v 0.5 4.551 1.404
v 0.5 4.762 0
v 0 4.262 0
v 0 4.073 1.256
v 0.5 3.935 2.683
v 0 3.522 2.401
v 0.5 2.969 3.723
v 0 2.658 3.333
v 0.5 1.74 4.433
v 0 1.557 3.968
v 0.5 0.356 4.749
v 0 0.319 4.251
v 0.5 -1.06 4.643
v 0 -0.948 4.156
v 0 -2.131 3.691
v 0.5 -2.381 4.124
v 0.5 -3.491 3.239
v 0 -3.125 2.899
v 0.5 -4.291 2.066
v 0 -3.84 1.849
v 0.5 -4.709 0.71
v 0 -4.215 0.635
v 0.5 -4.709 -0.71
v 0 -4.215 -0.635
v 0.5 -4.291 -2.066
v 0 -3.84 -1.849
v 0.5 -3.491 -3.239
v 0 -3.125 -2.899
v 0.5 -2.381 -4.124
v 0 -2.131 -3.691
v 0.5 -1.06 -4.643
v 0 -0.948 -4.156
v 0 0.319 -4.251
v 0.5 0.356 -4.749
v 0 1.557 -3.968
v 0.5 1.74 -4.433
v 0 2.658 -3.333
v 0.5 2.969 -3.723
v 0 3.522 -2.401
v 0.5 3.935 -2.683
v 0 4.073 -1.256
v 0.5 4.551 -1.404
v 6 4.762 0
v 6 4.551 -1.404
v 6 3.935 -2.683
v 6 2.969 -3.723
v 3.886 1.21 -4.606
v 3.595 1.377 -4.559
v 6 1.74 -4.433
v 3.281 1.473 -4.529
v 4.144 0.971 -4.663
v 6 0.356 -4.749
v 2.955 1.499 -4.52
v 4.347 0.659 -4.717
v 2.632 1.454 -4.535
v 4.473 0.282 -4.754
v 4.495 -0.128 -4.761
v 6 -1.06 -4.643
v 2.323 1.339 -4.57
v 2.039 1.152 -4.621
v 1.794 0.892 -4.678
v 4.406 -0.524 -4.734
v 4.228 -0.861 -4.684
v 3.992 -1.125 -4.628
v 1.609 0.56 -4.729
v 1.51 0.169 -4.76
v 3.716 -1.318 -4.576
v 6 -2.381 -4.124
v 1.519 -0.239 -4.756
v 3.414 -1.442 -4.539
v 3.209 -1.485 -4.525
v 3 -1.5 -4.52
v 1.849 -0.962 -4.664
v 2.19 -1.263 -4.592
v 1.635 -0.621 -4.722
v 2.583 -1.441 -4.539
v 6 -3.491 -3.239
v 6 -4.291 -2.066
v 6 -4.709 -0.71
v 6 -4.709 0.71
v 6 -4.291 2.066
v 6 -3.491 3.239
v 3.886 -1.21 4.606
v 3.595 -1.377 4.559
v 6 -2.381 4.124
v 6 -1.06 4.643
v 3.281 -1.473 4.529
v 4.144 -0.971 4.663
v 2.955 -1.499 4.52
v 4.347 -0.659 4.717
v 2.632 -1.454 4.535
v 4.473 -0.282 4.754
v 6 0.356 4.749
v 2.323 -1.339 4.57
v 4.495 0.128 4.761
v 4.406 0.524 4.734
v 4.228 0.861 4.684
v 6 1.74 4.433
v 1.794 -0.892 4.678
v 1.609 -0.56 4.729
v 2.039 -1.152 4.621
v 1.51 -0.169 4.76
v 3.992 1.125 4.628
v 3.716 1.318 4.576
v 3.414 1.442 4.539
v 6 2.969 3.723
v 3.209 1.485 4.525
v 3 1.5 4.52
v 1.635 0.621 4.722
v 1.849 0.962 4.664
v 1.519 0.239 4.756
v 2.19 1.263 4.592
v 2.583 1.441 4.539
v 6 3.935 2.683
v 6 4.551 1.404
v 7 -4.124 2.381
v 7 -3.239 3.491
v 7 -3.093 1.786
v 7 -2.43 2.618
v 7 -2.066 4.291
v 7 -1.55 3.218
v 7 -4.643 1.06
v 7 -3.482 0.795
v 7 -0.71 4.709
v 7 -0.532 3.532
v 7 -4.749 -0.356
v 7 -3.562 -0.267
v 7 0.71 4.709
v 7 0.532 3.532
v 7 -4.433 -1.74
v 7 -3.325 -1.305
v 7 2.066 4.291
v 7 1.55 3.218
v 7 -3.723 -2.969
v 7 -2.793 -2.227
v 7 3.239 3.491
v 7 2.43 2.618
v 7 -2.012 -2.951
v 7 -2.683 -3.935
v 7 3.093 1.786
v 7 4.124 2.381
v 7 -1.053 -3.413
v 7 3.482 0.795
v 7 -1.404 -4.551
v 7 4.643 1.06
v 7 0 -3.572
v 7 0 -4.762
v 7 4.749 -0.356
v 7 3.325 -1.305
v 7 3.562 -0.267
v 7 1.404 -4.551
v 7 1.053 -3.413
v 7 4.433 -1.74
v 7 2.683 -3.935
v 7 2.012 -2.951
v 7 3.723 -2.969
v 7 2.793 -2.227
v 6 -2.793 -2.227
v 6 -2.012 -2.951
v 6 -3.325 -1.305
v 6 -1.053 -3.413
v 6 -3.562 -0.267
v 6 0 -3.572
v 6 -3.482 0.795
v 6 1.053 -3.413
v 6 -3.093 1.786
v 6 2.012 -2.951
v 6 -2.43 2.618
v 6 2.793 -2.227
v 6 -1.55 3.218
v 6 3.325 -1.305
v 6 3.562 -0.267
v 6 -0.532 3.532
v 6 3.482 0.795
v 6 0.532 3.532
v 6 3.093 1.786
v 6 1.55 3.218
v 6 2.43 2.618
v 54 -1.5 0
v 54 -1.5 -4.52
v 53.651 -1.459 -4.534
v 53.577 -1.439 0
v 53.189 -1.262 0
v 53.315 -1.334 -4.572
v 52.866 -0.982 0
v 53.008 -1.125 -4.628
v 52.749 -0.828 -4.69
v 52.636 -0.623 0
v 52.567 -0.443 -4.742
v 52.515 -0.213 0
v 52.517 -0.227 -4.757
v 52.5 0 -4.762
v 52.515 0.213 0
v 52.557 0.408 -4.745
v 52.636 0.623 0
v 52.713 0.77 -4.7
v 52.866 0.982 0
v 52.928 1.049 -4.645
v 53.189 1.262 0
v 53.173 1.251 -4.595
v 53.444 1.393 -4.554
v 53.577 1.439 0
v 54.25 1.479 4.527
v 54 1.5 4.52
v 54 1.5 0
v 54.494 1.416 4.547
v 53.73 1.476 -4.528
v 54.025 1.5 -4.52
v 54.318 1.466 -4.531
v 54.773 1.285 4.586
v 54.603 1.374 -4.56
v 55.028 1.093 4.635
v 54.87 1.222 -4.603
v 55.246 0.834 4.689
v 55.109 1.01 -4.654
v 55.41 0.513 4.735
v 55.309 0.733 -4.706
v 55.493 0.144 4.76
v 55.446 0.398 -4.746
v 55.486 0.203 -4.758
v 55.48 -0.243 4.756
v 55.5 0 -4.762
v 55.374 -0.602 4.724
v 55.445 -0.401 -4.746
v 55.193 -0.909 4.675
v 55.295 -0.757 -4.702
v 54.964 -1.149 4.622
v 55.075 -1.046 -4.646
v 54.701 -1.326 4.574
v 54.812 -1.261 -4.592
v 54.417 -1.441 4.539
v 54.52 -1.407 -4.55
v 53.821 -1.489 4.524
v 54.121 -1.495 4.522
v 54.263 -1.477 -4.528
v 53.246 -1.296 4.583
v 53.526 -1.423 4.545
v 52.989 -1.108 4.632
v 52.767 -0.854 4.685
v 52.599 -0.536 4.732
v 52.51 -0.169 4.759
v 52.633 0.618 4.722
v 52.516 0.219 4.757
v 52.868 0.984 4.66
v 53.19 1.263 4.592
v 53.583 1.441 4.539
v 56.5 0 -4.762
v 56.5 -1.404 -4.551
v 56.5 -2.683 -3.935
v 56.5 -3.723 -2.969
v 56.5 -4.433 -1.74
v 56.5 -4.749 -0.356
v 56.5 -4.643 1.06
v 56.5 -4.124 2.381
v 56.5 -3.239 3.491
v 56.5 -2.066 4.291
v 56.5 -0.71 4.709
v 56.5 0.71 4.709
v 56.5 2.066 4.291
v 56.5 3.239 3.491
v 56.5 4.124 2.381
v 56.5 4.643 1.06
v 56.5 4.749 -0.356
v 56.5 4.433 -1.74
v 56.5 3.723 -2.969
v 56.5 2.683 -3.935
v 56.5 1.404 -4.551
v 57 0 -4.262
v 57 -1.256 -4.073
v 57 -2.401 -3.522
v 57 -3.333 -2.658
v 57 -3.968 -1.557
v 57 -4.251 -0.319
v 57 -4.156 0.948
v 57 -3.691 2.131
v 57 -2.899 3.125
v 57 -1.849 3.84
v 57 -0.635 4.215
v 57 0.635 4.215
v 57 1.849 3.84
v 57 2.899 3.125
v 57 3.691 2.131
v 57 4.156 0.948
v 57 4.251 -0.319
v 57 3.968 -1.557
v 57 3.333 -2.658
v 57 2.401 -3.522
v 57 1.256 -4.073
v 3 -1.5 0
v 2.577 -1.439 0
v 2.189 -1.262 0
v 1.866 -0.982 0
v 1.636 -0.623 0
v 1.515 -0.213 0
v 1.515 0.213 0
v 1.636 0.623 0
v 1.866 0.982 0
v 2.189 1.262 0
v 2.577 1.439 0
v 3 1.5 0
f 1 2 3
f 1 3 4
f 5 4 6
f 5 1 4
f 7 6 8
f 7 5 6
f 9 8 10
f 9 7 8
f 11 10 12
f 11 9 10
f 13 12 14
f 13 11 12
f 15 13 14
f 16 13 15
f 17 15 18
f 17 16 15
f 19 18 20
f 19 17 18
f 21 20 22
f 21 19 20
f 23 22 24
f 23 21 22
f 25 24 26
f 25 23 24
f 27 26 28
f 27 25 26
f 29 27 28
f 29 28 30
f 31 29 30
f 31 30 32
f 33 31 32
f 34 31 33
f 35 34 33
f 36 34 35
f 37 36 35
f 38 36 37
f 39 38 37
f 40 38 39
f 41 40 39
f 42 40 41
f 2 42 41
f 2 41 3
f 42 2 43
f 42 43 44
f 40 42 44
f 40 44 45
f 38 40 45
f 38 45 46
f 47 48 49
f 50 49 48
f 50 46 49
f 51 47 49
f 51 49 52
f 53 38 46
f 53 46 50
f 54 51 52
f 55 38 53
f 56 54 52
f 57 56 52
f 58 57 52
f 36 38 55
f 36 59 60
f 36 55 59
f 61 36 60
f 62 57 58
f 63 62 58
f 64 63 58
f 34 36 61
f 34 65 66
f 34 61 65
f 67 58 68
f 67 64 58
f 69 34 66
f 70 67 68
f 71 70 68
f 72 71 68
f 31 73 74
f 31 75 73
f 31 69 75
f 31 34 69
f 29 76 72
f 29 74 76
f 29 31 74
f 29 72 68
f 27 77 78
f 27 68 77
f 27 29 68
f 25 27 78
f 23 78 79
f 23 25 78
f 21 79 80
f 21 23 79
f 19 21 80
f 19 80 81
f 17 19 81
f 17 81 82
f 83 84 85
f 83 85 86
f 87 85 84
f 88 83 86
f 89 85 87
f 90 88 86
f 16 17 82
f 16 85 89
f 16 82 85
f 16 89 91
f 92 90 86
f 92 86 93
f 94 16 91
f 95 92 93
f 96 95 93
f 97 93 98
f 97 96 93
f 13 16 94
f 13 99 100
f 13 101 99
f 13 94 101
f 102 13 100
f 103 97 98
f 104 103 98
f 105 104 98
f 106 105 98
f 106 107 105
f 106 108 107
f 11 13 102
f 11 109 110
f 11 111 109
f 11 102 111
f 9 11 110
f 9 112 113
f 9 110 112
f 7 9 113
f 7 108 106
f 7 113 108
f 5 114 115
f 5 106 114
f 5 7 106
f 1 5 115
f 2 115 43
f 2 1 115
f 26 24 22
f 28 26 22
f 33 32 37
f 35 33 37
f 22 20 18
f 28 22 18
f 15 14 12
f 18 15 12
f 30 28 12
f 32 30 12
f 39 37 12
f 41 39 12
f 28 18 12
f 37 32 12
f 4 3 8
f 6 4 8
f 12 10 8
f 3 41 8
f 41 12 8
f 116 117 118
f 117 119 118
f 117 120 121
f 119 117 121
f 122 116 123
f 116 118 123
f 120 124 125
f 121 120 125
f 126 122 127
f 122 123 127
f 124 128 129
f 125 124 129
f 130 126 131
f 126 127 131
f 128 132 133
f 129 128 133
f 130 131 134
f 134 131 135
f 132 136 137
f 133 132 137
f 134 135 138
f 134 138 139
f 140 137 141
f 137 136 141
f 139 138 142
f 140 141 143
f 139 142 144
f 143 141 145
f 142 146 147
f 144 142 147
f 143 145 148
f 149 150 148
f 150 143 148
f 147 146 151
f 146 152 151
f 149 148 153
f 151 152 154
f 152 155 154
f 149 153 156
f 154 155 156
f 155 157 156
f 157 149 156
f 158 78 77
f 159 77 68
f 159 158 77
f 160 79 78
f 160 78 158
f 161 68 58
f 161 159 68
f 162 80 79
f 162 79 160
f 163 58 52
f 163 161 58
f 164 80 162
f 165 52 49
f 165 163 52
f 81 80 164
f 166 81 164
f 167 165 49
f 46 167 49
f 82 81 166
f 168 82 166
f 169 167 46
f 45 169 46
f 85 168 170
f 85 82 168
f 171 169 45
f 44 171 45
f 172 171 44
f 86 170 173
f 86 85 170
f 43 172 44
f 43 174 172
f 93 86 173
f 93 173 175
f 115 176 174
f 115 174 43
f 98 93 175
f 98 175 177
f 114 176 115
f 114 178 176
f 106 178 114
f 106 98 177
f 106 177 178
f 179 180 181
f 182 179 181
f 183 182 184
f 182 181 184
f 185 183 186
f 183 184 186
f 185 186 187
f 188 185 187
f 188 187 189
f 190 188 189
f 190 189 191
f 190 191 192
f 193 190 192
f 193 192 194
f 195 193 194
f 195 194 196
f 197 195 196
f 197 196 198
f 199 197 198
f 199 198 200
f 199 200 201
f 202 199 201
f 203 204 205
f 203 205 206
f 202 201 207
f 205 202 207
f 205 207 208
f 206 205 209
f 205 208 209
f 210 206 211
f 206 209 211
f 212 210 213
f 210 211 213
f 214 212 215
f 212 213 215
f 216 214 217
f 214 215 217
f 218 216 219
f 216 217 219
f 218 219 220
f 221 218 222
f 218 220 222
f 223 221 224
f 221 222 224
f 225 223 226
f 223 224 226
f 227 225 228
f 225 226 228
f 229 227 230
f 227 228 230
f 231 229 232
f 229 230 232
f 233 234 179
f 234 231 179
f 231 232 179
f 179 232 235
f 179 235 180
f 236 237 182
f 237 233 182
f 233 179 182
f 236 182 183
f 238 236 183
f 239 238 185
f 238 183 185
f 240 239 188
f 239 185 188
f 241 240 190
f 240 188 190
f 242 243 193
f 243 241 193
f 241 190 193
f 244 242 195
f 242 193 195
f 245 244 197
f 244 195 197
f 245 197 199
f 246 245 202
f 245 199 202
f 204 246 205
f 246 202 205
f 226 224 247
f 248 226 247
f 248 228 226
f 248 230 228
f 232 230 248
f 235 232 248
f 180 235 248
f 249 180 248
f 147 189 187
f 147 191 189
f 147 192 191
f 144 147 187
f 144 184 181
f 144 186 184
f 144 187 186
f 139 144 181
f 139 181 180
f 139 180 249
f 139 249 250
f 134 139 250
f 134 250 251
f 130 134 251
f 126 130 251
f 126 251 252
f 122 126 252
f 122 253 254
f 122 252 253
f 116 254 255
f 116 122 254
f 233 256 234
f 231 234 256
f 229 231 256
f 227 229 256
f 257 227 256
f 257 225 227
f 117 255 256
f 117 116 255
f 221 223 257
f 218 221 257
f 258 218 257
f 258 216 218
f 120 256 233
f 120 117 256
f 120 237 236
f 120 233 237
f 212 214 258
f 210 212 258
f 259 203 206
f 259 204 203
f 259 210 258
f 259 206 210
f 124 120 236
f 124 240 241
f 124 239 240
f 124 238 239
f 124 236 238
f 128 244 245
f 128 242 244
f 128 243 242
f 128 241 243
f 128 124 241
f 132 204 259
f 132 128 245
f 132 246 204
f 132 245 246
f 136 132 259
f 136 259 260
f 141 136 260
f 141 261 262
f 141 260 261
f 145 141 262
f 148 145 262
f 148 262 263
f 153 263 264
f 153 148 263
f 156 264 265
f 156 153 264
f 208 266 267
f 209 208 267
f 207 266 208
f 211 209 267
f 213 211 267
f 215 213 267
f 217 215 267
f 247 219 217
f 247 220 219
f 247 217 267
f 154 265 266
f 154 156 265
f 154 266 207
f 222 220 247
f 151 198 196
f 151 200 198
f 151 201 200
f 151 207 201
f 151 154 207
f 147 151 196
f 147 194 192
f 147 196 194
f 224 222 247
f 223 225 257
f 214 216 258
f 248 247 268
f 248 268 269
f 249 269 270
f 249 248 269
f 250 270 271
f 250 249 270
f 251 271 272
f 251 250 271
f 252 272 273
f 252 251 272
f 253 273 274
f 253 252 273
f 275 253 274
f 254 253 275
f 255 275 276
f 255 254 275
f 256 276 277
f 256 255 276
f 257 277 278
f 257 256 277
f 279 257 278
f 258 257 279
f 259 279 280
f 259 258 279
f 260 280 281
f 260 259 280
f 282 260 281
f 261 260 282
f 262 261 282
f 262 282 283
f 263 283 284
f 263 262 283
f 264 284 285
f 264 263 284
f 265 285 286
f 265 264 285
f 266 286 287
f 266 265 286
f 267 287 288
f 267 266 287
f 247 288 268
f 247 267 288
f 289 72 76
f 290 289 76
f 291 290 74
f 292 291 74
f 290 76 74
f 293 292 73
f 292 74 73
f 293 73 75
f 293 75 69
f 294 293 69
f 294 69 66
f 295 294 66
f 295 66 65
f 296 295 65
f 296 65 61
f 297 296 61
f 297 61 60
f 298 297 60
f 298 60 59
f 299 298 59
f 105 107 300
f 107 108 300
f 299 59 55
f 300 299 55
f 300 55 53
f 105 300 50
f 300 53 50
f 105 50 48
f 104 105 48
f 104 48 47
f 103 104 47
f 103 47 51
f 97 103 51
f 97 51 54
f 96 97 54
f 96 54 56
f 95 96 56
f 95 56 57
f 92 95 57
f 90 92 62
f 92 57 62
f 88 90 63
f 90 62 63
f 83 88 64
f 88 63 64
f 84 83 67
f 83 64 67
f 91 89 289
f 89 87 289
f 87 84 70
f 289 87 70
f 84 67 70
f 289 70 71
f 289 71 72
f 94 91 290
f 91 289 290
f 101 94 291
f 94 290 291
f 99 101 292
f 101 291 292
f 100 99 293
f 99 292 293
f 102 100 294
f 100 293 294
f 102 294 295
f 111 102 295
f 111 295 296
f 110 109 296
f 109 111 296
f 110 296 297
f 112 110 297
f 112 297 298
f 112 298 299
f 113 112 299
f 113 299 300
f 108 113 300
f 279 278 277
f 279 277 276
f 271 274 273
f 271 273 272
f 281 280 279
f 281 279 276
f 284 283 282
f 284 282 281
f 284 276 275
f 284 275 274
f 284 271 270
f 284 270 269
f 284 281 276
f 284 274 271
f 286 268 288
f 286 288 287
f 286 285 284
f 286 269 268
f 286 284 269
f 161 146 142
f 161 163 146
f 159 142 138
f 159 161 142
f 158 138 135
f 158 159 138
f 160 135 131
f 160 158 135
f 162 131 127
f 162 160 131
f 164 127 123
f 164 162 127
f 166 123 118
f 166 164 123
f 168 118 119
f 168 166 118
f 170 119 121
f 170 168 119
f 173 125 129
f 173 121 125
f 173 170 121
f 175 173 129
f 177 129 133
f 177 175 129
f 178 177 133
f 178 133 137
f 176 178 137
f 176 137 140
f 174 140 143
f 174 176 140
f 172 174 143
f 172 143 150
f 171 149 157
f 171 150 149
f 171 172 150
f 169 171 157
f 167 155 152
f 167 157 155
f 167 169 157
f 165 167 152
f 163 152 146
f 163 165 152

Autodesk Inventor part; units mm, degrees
ref_plane "YZ Plane" through (0, 0, 0) normal (1, 0, 0) x (0, 1, 0)
ref_plane "XZ Plane" through (0, 0, 0) normal (0, 1, 0) x (-1, 0, 0)
ref_plane "XY Plane" through (0, 0, 0) normal (0, 0, 1) x (1, 0, 0)
sketch "Esboço2" plane through (0, 0, 0) normal (1, 0, 0) x (0, 1, 0)
  circle A0 centre (0, 0) radius 4.7625
  dimension "d0" = 9.525
extrude "Extrusão1" add sketch "Esboço2" along normal blind 6
sketch "Esboço3" plane through (6, 0, 0) normal (1, 0, 0) x (0, 0, -1)
  circle A0 centre (0, 0) radius 4.7625 projected
  circle A1 centre (0, 0) radius 3.5719
  dimension "d3" = 7.1437
extrude "Extrusão2" add sketch "Esboço3" along normal blind 1 contours A1
sketch "Esboço4" plane through (7, 0, 0) normal (1, 0, 0) x (0, 0, -1)
  circle A0 centre (0, 0) radius 3.5719 projected
  circle A1 centre (0, 0) radius 4.7625
  dimension "d6" = 9.525
extrude "Extrusão3" add sketch "Esboço4" along normal blind 50 contours A0 | A1
chamfer "Chanfro1" distance 0.5 angle 45 2 edges at (0, -4.7625, 0) (57, 0, 4.7625)
sketch "Esboço7" plane through (0, 0, 0) normal (0, 0, 1) x (1, 0, 0)
  line L0 (57, 4.2625) -> (57, -4.2625) projected
  line L1 (0, -4.2625) -> (0, 4.2625) projected
  point P0 (0, 0)
  point P1 (54, 0)
  point P2 (3, 0)
  dimension "d18" = 3
  dimension "d33" = 3
hole "Furo1" at (54, 0, 0) at (3, 0, 0) direction (0, 0, -1) diameter 3 end through all
hole "Furo2" at (54, 0, 0) at (3, 0, 0) direction (0, 0, 1) diameter 3 end through all
equation "\"d33\" = d18"
properties part number "pino_a3" material "Aço carbono"
